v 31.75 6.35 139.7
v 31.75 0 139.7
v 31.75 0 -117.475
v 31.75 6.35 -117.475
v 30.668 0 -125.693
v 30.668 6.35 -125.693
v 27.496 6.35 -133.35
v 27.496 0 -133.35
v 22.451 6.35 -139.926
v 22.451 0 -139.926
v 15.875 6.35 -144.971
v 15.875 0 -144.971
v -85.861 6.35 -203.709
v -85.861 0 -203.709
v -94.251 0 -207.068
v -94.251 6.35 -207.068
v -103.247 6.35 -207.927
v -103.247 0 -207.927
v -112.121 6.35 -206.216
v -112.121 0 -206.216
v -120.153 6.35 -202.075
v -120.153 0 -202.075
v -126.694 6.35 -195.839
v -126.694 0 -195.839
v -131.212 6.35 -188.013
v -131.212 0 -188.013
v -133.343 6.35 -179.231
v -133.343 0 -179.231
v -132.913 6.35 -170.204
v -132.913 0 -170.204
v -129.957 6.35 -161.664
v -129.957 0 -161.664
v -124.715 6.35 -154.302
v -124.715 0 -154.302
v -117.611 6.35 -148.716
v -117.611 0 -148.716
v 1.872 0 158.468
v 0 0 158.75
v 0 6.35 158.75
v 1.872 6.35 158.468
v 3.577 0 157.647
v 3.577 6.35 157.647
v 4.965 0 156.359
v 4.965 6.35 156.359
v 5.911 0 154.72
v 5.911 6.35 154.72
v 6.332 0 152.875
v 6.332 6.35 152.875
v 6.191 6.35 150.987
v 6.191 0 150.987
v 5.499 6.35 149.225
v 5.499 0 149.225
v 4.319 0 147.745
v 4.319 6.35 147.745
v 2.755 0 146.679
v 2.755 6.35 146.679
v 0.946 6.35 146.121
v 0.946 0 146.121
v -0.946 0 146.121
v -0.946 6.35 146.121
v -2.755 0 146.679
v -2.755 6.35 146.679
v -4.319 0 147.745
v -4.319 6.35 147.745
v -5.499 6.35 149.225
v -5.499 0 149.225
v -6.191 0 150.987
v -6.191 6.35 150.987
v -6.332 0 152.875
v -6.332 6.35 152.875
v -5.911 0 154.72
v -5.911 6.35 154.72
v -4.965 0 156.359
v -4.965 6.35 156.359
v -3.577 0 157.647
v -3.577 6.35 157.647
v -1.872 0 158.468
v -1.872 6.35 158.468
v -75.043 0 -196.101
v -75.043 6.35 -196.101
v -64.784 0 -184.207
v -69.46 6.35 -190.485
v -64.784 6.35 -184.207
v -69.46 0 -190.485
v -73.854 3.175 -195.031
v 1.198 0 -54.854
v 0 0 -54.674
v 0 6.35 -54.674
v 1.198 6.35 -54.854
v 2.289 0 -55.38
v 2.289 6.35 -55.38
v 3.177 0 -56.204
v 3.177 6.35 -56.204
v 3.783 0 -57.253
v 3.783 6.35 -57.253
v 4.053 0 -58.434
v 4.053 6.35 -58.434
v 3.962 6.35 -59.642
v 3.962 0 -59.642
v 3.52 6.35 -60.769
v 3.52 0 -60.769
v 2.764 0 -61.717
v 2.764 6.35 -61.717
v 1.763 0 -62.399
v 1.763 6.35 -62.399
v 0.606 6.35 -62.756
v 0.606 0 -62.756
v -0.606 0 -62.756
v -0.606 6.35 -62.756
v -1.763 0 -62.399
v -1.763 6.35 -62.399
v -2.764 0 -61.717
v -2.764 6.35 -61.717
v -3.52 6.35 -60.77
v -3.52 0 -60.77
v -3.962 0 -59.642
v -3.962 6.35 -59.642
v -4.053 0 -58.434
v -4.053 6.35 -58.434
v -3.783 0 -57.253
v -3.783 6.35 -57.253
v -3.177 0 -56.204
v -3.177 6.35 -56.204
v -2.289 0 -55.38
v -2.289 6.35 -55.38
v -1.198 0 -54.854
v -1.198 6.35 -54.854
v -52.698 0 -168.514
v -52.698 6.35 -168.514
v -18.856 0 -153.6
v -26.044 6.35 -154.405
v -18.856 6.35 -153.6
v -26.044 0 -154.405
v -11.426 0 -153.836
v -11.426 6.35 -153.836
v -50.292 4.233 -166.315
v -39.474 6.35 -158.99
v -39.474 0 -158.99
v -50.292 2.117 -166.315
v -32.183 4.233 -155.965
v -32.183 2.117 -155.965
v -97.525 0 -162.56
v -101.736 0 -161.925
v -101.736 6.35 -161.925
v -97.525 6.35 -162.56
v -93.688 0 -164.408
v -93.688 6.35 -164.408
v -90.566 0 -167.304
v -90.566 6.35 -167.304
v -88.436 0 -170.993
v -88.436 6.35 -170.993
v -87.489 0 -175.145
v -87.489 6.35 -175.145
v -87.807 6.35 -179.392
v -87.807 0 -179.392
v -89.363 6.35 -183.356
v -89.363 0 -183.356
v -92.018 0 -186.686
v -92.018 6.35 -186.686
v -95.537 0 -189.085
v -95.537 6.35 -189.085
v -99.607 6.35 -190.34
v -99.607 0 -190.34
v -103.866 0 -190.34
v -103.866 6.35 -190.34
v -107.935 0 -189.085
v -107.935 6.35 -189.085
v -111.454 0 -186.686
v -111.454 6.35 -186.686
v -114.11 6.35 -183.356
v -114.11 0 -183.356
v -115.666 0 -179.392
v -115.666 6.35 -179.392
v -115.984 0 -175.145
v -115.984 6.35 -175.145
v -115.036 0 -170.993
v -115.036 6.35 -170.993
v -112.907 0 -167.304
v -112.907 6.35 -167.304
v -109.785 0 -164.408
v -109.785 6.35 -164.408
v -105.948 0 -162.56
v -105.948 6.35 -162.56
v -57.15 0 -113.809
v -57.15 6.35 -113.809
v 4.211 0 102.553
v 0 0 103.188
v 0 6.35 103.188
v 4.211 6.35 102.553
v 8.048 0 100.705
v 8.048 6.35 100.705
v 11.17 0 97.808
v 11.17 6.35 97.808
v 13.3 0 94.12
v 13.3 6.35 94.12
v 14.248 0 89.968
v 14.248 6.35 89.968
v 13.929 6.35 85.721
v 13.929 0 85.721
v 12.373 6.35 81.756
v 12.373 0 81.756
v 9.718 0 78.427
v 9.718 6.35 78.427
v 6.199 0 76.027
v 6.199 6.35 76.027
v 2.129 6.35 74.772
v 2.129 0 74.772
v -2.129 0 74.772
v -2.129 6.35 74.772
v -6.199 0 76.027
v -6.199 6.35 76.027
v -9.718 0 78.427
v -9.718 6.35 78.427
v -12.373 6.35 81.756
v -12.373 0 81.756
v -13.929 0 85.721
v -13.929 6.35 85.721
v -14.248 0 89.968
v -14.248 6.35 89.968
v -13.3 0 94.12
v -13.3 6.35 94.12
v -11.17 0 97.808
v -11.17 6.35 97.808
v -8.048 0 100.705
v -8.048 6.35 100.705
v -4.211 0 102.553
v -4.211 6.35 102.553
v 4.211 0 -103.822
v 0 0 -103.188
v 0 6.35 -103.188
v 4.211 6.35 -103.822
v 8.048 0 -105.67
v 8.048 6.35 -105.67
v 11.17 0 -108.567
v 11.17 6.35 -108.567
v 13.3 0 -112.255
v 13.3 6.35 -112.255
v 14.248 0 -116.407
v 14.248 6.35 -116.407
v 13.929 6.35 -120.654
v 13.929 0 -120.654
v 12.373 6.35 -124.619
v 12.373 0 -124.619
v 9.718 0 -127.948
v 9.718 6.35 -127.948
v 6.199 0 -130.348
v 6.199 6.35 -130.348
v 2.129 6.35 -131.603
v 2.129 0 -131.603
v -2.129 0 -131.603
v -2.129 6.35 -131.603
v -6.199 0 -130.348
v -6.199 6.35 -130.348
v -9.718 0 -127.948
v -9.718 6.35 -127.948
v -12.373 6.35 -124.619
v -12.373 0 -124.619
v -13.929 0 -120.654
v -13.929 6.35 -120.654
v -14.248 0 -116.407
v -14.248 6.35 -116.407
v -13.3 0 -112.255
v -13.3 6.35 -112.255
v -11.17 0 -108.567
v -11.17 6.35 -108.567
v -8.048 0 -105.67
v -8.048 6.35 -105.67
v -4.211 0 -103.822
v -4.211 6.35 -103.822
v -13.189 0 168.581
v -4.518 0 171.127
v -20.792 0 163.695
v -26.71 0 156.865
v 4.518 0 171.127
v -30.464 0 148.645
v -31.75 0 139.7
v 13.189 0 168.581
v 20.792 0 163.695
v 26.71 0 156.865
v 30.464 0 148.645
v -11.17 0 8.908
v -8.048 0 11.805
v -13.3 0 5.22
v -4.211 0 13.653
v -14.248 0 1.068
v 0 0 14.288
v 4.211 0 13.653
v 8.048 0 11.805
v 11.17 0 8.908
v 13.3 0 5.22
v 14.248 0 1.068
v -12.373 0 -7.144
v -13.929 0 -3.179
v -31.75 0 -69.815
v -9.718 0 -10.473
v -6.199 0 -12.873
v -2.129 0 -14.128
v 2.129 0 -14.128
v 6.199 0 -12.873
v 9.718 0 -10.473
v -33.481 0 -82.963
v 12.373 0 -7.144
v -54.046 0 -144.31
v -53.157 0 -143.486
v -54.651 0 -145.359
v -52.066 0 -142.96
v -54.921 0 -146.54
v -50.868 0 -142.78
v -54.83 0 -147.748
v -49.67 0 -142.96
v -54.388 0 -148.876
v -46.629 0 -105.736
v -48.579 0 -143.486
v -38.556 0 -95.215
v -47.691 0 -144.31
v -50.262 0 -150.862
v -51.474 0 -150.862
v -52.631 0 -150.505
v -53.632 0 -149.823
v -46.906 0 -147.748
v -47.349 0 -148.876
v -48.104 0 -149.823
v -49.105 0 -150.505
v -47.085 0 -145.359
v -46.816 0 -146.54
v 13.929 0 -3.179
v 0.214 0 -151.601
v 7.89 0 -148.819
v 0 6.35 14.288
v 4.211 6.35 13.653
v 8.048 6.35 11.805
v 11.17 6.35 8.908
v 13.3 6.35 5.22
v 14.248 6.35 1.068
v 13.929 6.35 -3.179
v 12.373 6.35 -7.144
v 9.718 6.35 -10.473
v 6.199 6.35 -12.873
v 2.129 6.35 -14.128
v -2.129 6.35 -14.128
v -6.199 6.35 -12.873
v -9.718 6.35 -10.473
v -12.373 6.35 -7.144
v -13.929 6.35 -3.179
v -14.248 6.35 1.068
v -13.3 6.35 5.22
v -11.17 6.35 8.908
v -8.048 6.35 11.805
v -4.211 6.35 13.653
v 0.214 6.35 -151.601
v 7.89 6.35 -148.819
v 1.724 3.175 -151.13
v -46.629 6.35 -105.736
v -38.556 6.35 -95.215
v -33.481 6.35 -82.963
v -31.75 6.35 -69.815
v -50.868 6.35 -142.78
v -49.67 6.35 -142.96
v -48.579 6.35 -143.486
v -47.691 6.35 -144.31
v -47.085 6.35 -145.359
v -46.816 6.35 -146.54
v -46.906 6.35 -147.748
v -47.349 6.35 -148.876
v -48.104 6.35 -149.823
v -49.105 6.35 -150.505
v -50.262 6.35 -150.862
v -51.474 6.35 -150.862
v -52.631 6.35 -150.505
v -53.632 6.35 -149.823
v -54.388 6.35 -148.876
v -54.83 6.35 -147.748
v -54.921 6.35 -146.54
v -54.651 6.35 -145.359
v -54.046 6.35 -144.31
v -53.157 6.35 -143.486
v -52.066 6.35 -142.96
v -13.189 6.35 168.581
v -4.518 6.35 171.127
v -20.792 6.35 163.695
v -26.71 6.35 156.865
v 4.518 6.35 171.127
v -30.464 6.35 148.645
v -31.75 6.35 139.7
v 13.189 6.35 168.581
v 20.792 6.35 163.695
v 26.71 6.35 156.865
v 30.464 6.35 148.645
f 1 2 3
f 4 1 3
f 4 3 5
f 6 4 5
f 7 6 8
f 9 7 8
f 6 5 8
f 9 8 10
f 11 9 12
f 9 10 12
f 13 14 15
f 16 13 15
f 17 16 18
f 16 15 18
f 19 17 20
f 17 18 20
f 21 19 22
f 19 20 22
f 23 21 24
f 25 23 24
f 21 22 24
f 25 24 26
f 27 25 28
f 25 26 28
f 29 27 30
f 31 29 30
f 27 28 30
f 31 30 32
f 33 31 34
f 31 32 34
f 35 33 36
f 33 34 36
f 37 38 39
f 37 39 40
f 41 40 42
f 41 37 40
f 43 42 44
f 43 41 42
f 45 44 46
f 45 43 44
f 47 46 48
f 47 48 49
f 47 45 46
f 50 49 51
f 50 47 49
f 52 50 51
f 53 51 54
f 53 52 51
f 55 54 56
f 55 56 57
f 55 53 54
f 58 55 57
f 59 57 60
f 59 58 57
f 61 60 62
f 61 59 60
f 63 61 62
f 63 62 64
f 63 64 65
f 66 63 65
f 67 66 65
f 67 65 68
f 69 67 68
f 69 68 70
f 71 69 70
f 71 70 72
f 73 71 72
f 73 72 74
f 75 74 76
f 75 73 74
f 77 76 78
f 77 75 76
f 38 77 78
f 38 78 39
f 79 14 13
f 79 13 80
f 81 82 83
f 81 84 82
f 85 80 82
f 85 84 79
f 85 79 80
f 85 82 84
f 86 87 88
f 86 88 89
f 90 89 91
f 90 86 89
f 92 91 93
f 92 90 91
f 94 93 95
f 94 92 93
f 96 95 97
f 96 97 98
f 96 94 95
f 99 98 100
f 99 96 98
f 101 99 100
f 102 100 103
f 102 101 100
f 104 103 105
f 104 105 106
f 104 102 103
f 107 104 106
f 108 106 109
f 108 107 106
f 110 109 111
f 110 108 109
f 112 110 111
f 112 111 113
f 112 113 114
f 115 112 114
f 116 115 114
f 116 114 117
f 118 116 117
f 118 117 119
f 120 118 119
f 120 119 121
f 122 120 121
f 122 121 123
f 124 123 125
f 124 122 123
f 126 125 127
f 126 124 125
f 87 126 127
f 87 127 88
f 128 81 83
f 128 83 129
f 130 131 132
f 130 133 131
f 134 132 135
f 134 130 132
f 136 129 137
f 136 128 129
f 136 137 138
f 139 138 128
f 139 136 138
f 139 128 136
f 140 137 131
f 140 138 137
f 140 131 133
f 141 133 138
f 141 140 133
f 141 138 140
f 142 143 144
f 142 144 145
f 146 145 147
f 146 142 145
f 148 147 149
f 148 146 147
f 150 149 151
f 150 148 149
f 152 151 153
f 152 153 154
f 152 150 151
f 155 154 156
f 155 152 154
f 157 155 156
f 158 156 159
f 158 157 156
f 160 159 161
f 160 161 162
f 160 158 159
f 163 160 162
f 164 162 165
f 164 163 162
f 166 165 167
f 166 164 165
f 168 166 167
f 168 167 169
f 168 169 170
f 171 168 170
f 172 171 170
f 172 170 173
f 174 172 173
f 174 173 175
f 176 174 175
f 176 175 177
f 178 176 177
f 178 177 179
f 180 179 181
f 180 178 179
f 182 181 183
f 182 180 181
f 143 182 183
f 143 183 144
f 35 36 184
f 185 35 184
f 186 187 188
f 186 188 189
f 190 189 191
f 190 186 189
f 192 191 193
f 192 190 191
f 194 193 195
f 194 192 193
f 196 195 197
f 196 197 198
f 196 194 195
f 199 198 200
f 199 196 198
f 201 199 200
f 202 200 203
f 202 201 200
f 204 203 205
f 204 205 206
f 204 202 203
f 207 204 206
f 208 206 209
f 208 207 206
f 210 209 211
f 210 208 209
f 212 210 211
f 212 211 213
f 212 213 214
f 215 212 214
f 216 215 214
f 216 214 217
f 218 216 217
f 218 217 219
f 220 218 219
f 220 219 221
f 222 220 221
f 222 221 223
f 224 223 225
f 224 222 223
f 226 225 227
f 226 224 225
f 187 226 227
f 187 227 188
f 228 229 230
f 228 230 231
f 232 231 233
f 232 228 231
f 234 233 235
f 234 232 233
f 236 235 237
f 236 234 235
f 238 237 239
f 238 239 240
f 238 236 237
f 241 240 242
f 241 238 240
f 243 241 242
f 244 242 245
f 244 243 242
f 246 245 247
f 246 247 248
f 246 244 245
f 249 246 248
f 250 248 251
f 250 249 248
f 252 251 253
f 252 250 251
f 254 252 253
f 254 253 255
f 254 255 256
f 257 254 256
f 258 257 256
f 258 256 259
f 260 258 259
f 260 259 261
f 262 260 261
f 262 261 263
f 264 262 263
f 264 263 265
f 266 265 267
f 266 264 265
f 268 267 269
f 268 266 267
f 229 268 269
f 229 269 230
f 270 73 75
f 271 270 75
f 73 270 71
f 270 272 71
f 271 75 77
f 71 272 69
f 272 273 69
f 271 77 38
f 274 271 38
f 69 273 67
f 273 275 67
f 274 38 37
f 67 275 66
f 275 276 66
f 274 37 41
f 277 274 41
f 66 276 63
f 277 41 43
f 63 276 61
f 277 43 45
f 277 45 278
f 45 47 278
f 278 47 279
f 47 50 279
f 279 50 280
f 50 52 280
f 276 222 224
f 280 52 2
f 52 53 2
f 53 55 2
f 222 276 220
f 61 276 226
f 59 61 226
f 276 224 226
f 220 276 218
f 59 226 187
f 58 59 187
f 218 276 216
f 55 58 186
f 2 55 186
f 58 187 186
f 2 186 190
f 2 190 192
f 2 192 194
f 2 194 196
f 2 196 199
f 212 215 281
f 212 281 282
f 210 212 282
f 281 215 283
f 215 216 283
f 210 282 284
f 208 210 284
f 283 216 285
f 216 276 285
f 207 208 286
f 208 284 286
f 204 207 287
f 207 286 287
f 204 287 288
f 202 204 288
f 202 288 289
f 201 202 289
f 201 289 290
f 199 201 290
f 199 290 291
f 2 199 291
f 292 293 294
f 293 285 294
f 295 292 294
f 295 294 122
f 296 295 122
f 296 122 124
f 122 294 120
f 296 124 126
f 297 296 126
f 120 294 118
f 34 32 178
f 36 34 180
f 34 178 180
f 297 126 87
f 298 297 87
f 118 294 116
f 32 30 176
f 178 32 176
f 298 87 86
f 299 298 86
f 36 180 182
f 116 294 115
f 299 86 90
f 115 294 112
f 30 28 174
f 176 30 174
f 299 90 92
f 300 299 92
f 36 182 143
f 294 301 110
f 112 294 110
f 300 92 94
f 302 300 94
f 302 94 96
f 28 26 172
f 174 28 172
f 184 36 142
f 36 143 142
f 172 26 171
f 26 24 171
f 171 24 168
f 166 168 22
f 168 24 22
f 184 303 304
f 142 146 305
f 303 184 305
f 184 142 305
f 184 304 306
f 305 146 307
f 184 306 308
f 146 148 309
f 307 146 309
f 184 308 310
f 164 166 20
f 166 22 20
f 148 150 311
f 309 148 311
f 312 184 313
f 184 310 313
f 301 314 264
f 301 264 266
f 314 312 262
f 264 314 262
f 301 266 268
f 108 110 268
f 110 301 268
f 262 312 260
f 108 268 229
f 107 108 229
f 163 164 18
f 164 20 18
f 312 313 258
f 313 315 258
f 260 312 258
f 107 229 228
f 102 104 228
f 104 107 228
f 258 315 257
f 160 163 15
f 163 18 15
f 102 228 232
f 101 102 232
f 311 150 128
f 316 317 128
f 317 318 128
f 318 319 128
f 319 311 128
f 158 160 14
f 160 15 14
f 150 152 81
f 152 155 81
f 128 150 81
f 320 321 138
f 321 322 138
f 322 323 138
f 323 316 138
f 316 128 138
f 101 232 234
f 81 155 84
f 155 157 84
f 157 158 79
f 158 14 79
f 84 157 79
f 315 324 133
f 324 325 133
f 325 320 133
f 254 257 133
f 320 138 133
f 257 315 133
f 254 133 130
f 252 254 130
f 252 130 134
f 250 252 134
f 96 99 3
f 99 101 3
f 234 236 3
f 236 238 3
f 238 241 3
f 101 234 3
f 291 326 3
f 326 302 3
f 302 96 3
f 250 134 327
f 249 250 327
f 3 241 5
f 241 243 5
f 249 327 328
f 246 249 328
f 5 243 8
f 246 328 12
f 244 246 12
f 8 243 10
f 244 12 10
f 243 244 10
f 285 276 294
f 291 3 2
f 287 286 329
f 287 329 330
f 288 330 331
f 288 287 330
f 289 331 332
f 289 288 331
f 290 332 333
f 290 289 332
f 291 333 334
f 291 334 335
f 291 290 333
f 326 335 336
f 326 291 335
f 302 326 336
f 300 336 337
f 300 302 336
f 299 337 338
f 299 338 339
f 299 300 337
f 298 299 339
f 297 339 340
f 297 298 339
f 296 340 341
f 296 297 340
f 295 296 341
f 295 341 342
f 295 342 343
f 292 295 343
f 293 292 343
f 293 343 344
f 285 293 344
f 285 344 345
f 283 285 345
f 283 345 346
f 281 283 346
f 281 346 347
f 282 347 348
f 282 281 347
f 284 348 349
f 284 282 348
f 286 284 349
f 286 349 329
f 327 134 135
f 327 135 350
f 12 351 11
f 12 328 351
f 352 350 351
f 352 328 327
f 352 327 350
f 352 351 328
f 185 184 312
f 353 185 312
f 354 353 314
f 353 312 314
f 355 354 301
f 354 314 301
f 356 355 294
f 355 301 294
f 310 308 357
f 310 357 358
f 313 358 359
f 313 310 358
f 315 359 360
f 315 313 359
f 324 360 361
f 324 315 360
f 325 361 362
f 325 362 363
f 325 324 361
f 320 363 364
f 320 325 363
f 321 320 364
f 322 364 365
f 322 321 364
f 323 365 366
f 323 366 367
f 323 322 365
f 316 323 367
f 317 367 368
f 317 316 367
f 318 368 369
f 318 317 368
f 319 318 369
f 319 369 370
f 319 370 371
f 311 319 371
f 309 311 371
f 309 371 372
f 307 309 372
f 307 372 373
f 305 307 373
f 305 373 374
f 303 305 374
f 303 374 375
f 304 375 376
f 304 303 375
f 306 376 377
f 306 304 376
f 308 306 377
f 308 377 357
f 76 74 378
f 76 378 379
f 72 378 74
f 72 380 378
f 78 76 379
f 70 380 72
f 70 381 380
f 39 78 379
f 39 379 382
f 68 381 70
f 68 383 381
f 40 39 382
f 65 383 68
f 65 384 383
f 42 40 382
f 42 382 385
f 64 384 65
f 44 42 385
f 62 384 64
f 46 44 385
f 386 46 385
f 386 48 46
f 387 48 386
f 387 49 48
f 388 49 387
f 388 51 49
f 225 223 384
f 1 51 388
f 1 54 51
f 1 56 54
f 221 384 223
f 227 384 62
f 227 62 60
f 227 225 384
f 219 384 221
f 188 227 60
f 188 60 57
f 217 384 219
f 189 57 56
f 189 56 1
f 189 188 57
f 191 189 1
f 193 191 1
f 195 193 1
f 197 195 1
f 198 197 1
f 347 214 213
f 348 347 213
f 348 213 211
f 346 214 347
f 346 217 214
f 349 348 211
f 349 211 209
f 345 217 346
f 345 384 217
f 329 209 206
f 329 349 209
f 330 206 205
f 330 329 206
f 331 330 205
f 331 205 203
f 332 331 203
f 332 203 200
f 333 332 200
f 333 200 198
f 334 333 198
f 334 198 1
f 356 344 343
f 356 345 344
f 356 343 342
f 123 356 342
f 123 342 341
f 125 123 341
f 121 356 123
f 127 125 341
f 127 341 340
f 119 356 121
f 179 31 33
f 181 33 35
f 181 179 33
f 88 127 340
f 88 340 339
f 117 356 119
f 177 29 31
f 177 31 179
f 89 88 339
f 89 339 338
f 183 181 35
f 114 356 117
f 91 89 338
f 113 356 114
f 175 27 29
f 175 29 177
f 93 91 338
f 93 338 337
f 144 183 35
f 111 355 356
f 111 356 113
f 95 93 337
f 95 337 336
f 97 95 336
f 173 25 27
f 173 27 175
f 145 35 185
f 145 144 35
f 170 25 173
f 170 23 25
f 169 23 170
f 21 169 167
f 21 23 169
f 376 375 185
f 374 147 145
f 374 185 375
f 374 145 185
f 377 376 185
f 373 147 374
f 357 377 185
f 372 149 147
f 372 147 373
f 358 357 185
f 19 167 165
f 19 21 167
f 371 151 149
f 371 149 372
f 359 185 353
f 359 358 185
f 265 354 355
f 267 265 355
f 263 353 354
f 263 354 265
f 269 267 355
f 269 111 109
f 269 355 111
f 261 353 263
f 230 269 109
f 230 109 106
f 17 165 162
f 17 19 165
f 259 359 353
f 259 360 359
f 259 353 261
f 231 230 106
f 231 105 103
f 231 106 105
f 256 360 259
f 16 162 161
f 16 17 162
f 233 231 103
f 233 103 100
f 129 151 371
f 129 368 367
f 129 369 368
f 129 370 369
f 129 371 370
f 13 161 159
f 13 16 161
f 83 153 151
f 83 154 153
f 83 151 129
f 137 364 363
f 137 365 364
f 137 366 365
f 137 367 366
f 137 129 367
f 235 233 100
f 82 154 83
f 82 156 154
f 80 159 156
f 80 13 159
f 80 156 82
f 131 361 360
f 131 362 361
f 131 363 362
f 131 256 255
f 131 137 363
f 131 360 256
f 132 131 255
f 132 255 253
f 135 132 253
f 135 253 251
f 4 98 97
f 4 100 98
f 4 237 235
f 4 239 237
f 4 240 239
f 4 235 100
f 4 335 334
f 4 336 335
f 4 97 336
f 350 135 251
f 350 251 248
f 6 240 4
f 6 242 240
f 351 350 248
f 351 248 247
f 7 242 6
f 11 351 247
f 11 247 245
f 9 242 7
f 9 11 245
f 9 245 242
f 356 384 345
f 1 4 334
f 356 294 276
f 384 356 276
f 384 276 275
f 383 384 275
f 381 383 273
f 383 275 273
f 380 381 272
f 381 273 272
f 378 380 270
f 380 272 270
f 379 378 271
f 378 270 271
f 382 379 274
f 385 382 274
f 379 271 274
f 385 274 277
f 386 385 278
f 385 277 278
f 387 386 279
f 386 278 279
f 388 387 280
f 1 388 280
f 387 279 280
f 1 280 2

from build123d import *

# Parameters (mm, degrees)
SKETCH2_R           = 14.2875
SKETCH2_R_2         = 4.064
SKETCH2_R_3         = 6.35
BOSS_EXTRUDE1_DEPTH = 6.35


with BuildPart() as part:
    # Sketch2 → Boss-Extrude1 (new body)
    with BuildSketch(Plane(origin=(0, 0, 0), x_dir=(1, 0, 0), z_dir=(0, 1, 0))):
        with BuildLine():
            Line((31.75, -78.393028047), (31.75, 117.475))
            ThreePointArc((31.75, 117.475), (27.49630657, 133.35), (15.875, 144.97130657))
            add(Edge.make_bspline(
                [(-11.426385325, 153.835795689), (1.224450482, 152.855976047), (15.875, 144.97130657)],
                knots=[0, 0, 0, 1, 1, 1], degree=2))
            add(Edge.make_bspline(
                [(-64.783506655, 184.207168681), (-52.423507121, 162.771572898), (-33.18367174, 151.627706727), (-11.426385325, 153.835795689)],
                knots=[0, 0, 0, 0, 1, 1, 1, 1], degree=3))
            add(Edge.make_bspline(
                [(-85.86133431, 203.70880657), (-72.386286962, 196.104383794), (-64.783506655, 184.207168681)],
                knots=[0, 0, 0, 1, 1, 1], degree=2))
            ThreePointArc((-85.86133431, 203.70880657), (-129.23264088, 192.0875), (-117.61133431, 148.71619343))
            Line((-117.61133431, 148.71619343), (-57.15, 113.808825791))
            ThreePointArc((-57.15, 113.808825791), (-38.555909488, 95.214735278), (-31.75, 69.814735278))
            Line((-31.75, 69.814735278), (-31.75, -18.272918452))
            Line((-31.75, -18.272918452), (-31.75, -139.7))
            ThreePointArc((-31.75, -139.7), (0, -171.45), (31.75, -139.7))
            Line((31.75, -139.7), (31.75, -78.393028047))
        make_face()
        with Locations(Location((0, 0, 0), (0, 0, 270))):
            Circle(SKETCH2_R, mode=Mode.SUBTRACT)
        with Locations(Location((0, -88.9, 0), (0, 0, 270))):
            Circle(SKETCH2_R, mode=Mode.SUBTRACT)
        with Locations(Location((0, 117.475, 0), (0, 0, 270))):
            Circle(SKETCH2_R, mode=Mode.SUBTRACT)
        with Locations(Location((-101.73633431, 176.2125, 0), (0, 0, 270))):
            Circle(SKETCH2_R, mode=Mode.SUBTRACT)
        with Locations(Location((-50.868167155, 146.84375, 0), (0, 0, 270))):
            Circle(SKETCH2_R_2, mode=Mode.SUBTRACT)
        with Locations(Location((0, 58.7375, 0), (0, 0, 270))):
            Circle(SKETCH2_R_2, mode=Mode.SUBTRACT)
        with Locations(Location((0, -152.4, 0), (0, 0, 270))):
            Circle(SKETCH2_R_3, mode=Mode.SUBTRACT)
    extrude(amount=BOSS_EXTRUDE1_DEPTH)


solid = part.part
